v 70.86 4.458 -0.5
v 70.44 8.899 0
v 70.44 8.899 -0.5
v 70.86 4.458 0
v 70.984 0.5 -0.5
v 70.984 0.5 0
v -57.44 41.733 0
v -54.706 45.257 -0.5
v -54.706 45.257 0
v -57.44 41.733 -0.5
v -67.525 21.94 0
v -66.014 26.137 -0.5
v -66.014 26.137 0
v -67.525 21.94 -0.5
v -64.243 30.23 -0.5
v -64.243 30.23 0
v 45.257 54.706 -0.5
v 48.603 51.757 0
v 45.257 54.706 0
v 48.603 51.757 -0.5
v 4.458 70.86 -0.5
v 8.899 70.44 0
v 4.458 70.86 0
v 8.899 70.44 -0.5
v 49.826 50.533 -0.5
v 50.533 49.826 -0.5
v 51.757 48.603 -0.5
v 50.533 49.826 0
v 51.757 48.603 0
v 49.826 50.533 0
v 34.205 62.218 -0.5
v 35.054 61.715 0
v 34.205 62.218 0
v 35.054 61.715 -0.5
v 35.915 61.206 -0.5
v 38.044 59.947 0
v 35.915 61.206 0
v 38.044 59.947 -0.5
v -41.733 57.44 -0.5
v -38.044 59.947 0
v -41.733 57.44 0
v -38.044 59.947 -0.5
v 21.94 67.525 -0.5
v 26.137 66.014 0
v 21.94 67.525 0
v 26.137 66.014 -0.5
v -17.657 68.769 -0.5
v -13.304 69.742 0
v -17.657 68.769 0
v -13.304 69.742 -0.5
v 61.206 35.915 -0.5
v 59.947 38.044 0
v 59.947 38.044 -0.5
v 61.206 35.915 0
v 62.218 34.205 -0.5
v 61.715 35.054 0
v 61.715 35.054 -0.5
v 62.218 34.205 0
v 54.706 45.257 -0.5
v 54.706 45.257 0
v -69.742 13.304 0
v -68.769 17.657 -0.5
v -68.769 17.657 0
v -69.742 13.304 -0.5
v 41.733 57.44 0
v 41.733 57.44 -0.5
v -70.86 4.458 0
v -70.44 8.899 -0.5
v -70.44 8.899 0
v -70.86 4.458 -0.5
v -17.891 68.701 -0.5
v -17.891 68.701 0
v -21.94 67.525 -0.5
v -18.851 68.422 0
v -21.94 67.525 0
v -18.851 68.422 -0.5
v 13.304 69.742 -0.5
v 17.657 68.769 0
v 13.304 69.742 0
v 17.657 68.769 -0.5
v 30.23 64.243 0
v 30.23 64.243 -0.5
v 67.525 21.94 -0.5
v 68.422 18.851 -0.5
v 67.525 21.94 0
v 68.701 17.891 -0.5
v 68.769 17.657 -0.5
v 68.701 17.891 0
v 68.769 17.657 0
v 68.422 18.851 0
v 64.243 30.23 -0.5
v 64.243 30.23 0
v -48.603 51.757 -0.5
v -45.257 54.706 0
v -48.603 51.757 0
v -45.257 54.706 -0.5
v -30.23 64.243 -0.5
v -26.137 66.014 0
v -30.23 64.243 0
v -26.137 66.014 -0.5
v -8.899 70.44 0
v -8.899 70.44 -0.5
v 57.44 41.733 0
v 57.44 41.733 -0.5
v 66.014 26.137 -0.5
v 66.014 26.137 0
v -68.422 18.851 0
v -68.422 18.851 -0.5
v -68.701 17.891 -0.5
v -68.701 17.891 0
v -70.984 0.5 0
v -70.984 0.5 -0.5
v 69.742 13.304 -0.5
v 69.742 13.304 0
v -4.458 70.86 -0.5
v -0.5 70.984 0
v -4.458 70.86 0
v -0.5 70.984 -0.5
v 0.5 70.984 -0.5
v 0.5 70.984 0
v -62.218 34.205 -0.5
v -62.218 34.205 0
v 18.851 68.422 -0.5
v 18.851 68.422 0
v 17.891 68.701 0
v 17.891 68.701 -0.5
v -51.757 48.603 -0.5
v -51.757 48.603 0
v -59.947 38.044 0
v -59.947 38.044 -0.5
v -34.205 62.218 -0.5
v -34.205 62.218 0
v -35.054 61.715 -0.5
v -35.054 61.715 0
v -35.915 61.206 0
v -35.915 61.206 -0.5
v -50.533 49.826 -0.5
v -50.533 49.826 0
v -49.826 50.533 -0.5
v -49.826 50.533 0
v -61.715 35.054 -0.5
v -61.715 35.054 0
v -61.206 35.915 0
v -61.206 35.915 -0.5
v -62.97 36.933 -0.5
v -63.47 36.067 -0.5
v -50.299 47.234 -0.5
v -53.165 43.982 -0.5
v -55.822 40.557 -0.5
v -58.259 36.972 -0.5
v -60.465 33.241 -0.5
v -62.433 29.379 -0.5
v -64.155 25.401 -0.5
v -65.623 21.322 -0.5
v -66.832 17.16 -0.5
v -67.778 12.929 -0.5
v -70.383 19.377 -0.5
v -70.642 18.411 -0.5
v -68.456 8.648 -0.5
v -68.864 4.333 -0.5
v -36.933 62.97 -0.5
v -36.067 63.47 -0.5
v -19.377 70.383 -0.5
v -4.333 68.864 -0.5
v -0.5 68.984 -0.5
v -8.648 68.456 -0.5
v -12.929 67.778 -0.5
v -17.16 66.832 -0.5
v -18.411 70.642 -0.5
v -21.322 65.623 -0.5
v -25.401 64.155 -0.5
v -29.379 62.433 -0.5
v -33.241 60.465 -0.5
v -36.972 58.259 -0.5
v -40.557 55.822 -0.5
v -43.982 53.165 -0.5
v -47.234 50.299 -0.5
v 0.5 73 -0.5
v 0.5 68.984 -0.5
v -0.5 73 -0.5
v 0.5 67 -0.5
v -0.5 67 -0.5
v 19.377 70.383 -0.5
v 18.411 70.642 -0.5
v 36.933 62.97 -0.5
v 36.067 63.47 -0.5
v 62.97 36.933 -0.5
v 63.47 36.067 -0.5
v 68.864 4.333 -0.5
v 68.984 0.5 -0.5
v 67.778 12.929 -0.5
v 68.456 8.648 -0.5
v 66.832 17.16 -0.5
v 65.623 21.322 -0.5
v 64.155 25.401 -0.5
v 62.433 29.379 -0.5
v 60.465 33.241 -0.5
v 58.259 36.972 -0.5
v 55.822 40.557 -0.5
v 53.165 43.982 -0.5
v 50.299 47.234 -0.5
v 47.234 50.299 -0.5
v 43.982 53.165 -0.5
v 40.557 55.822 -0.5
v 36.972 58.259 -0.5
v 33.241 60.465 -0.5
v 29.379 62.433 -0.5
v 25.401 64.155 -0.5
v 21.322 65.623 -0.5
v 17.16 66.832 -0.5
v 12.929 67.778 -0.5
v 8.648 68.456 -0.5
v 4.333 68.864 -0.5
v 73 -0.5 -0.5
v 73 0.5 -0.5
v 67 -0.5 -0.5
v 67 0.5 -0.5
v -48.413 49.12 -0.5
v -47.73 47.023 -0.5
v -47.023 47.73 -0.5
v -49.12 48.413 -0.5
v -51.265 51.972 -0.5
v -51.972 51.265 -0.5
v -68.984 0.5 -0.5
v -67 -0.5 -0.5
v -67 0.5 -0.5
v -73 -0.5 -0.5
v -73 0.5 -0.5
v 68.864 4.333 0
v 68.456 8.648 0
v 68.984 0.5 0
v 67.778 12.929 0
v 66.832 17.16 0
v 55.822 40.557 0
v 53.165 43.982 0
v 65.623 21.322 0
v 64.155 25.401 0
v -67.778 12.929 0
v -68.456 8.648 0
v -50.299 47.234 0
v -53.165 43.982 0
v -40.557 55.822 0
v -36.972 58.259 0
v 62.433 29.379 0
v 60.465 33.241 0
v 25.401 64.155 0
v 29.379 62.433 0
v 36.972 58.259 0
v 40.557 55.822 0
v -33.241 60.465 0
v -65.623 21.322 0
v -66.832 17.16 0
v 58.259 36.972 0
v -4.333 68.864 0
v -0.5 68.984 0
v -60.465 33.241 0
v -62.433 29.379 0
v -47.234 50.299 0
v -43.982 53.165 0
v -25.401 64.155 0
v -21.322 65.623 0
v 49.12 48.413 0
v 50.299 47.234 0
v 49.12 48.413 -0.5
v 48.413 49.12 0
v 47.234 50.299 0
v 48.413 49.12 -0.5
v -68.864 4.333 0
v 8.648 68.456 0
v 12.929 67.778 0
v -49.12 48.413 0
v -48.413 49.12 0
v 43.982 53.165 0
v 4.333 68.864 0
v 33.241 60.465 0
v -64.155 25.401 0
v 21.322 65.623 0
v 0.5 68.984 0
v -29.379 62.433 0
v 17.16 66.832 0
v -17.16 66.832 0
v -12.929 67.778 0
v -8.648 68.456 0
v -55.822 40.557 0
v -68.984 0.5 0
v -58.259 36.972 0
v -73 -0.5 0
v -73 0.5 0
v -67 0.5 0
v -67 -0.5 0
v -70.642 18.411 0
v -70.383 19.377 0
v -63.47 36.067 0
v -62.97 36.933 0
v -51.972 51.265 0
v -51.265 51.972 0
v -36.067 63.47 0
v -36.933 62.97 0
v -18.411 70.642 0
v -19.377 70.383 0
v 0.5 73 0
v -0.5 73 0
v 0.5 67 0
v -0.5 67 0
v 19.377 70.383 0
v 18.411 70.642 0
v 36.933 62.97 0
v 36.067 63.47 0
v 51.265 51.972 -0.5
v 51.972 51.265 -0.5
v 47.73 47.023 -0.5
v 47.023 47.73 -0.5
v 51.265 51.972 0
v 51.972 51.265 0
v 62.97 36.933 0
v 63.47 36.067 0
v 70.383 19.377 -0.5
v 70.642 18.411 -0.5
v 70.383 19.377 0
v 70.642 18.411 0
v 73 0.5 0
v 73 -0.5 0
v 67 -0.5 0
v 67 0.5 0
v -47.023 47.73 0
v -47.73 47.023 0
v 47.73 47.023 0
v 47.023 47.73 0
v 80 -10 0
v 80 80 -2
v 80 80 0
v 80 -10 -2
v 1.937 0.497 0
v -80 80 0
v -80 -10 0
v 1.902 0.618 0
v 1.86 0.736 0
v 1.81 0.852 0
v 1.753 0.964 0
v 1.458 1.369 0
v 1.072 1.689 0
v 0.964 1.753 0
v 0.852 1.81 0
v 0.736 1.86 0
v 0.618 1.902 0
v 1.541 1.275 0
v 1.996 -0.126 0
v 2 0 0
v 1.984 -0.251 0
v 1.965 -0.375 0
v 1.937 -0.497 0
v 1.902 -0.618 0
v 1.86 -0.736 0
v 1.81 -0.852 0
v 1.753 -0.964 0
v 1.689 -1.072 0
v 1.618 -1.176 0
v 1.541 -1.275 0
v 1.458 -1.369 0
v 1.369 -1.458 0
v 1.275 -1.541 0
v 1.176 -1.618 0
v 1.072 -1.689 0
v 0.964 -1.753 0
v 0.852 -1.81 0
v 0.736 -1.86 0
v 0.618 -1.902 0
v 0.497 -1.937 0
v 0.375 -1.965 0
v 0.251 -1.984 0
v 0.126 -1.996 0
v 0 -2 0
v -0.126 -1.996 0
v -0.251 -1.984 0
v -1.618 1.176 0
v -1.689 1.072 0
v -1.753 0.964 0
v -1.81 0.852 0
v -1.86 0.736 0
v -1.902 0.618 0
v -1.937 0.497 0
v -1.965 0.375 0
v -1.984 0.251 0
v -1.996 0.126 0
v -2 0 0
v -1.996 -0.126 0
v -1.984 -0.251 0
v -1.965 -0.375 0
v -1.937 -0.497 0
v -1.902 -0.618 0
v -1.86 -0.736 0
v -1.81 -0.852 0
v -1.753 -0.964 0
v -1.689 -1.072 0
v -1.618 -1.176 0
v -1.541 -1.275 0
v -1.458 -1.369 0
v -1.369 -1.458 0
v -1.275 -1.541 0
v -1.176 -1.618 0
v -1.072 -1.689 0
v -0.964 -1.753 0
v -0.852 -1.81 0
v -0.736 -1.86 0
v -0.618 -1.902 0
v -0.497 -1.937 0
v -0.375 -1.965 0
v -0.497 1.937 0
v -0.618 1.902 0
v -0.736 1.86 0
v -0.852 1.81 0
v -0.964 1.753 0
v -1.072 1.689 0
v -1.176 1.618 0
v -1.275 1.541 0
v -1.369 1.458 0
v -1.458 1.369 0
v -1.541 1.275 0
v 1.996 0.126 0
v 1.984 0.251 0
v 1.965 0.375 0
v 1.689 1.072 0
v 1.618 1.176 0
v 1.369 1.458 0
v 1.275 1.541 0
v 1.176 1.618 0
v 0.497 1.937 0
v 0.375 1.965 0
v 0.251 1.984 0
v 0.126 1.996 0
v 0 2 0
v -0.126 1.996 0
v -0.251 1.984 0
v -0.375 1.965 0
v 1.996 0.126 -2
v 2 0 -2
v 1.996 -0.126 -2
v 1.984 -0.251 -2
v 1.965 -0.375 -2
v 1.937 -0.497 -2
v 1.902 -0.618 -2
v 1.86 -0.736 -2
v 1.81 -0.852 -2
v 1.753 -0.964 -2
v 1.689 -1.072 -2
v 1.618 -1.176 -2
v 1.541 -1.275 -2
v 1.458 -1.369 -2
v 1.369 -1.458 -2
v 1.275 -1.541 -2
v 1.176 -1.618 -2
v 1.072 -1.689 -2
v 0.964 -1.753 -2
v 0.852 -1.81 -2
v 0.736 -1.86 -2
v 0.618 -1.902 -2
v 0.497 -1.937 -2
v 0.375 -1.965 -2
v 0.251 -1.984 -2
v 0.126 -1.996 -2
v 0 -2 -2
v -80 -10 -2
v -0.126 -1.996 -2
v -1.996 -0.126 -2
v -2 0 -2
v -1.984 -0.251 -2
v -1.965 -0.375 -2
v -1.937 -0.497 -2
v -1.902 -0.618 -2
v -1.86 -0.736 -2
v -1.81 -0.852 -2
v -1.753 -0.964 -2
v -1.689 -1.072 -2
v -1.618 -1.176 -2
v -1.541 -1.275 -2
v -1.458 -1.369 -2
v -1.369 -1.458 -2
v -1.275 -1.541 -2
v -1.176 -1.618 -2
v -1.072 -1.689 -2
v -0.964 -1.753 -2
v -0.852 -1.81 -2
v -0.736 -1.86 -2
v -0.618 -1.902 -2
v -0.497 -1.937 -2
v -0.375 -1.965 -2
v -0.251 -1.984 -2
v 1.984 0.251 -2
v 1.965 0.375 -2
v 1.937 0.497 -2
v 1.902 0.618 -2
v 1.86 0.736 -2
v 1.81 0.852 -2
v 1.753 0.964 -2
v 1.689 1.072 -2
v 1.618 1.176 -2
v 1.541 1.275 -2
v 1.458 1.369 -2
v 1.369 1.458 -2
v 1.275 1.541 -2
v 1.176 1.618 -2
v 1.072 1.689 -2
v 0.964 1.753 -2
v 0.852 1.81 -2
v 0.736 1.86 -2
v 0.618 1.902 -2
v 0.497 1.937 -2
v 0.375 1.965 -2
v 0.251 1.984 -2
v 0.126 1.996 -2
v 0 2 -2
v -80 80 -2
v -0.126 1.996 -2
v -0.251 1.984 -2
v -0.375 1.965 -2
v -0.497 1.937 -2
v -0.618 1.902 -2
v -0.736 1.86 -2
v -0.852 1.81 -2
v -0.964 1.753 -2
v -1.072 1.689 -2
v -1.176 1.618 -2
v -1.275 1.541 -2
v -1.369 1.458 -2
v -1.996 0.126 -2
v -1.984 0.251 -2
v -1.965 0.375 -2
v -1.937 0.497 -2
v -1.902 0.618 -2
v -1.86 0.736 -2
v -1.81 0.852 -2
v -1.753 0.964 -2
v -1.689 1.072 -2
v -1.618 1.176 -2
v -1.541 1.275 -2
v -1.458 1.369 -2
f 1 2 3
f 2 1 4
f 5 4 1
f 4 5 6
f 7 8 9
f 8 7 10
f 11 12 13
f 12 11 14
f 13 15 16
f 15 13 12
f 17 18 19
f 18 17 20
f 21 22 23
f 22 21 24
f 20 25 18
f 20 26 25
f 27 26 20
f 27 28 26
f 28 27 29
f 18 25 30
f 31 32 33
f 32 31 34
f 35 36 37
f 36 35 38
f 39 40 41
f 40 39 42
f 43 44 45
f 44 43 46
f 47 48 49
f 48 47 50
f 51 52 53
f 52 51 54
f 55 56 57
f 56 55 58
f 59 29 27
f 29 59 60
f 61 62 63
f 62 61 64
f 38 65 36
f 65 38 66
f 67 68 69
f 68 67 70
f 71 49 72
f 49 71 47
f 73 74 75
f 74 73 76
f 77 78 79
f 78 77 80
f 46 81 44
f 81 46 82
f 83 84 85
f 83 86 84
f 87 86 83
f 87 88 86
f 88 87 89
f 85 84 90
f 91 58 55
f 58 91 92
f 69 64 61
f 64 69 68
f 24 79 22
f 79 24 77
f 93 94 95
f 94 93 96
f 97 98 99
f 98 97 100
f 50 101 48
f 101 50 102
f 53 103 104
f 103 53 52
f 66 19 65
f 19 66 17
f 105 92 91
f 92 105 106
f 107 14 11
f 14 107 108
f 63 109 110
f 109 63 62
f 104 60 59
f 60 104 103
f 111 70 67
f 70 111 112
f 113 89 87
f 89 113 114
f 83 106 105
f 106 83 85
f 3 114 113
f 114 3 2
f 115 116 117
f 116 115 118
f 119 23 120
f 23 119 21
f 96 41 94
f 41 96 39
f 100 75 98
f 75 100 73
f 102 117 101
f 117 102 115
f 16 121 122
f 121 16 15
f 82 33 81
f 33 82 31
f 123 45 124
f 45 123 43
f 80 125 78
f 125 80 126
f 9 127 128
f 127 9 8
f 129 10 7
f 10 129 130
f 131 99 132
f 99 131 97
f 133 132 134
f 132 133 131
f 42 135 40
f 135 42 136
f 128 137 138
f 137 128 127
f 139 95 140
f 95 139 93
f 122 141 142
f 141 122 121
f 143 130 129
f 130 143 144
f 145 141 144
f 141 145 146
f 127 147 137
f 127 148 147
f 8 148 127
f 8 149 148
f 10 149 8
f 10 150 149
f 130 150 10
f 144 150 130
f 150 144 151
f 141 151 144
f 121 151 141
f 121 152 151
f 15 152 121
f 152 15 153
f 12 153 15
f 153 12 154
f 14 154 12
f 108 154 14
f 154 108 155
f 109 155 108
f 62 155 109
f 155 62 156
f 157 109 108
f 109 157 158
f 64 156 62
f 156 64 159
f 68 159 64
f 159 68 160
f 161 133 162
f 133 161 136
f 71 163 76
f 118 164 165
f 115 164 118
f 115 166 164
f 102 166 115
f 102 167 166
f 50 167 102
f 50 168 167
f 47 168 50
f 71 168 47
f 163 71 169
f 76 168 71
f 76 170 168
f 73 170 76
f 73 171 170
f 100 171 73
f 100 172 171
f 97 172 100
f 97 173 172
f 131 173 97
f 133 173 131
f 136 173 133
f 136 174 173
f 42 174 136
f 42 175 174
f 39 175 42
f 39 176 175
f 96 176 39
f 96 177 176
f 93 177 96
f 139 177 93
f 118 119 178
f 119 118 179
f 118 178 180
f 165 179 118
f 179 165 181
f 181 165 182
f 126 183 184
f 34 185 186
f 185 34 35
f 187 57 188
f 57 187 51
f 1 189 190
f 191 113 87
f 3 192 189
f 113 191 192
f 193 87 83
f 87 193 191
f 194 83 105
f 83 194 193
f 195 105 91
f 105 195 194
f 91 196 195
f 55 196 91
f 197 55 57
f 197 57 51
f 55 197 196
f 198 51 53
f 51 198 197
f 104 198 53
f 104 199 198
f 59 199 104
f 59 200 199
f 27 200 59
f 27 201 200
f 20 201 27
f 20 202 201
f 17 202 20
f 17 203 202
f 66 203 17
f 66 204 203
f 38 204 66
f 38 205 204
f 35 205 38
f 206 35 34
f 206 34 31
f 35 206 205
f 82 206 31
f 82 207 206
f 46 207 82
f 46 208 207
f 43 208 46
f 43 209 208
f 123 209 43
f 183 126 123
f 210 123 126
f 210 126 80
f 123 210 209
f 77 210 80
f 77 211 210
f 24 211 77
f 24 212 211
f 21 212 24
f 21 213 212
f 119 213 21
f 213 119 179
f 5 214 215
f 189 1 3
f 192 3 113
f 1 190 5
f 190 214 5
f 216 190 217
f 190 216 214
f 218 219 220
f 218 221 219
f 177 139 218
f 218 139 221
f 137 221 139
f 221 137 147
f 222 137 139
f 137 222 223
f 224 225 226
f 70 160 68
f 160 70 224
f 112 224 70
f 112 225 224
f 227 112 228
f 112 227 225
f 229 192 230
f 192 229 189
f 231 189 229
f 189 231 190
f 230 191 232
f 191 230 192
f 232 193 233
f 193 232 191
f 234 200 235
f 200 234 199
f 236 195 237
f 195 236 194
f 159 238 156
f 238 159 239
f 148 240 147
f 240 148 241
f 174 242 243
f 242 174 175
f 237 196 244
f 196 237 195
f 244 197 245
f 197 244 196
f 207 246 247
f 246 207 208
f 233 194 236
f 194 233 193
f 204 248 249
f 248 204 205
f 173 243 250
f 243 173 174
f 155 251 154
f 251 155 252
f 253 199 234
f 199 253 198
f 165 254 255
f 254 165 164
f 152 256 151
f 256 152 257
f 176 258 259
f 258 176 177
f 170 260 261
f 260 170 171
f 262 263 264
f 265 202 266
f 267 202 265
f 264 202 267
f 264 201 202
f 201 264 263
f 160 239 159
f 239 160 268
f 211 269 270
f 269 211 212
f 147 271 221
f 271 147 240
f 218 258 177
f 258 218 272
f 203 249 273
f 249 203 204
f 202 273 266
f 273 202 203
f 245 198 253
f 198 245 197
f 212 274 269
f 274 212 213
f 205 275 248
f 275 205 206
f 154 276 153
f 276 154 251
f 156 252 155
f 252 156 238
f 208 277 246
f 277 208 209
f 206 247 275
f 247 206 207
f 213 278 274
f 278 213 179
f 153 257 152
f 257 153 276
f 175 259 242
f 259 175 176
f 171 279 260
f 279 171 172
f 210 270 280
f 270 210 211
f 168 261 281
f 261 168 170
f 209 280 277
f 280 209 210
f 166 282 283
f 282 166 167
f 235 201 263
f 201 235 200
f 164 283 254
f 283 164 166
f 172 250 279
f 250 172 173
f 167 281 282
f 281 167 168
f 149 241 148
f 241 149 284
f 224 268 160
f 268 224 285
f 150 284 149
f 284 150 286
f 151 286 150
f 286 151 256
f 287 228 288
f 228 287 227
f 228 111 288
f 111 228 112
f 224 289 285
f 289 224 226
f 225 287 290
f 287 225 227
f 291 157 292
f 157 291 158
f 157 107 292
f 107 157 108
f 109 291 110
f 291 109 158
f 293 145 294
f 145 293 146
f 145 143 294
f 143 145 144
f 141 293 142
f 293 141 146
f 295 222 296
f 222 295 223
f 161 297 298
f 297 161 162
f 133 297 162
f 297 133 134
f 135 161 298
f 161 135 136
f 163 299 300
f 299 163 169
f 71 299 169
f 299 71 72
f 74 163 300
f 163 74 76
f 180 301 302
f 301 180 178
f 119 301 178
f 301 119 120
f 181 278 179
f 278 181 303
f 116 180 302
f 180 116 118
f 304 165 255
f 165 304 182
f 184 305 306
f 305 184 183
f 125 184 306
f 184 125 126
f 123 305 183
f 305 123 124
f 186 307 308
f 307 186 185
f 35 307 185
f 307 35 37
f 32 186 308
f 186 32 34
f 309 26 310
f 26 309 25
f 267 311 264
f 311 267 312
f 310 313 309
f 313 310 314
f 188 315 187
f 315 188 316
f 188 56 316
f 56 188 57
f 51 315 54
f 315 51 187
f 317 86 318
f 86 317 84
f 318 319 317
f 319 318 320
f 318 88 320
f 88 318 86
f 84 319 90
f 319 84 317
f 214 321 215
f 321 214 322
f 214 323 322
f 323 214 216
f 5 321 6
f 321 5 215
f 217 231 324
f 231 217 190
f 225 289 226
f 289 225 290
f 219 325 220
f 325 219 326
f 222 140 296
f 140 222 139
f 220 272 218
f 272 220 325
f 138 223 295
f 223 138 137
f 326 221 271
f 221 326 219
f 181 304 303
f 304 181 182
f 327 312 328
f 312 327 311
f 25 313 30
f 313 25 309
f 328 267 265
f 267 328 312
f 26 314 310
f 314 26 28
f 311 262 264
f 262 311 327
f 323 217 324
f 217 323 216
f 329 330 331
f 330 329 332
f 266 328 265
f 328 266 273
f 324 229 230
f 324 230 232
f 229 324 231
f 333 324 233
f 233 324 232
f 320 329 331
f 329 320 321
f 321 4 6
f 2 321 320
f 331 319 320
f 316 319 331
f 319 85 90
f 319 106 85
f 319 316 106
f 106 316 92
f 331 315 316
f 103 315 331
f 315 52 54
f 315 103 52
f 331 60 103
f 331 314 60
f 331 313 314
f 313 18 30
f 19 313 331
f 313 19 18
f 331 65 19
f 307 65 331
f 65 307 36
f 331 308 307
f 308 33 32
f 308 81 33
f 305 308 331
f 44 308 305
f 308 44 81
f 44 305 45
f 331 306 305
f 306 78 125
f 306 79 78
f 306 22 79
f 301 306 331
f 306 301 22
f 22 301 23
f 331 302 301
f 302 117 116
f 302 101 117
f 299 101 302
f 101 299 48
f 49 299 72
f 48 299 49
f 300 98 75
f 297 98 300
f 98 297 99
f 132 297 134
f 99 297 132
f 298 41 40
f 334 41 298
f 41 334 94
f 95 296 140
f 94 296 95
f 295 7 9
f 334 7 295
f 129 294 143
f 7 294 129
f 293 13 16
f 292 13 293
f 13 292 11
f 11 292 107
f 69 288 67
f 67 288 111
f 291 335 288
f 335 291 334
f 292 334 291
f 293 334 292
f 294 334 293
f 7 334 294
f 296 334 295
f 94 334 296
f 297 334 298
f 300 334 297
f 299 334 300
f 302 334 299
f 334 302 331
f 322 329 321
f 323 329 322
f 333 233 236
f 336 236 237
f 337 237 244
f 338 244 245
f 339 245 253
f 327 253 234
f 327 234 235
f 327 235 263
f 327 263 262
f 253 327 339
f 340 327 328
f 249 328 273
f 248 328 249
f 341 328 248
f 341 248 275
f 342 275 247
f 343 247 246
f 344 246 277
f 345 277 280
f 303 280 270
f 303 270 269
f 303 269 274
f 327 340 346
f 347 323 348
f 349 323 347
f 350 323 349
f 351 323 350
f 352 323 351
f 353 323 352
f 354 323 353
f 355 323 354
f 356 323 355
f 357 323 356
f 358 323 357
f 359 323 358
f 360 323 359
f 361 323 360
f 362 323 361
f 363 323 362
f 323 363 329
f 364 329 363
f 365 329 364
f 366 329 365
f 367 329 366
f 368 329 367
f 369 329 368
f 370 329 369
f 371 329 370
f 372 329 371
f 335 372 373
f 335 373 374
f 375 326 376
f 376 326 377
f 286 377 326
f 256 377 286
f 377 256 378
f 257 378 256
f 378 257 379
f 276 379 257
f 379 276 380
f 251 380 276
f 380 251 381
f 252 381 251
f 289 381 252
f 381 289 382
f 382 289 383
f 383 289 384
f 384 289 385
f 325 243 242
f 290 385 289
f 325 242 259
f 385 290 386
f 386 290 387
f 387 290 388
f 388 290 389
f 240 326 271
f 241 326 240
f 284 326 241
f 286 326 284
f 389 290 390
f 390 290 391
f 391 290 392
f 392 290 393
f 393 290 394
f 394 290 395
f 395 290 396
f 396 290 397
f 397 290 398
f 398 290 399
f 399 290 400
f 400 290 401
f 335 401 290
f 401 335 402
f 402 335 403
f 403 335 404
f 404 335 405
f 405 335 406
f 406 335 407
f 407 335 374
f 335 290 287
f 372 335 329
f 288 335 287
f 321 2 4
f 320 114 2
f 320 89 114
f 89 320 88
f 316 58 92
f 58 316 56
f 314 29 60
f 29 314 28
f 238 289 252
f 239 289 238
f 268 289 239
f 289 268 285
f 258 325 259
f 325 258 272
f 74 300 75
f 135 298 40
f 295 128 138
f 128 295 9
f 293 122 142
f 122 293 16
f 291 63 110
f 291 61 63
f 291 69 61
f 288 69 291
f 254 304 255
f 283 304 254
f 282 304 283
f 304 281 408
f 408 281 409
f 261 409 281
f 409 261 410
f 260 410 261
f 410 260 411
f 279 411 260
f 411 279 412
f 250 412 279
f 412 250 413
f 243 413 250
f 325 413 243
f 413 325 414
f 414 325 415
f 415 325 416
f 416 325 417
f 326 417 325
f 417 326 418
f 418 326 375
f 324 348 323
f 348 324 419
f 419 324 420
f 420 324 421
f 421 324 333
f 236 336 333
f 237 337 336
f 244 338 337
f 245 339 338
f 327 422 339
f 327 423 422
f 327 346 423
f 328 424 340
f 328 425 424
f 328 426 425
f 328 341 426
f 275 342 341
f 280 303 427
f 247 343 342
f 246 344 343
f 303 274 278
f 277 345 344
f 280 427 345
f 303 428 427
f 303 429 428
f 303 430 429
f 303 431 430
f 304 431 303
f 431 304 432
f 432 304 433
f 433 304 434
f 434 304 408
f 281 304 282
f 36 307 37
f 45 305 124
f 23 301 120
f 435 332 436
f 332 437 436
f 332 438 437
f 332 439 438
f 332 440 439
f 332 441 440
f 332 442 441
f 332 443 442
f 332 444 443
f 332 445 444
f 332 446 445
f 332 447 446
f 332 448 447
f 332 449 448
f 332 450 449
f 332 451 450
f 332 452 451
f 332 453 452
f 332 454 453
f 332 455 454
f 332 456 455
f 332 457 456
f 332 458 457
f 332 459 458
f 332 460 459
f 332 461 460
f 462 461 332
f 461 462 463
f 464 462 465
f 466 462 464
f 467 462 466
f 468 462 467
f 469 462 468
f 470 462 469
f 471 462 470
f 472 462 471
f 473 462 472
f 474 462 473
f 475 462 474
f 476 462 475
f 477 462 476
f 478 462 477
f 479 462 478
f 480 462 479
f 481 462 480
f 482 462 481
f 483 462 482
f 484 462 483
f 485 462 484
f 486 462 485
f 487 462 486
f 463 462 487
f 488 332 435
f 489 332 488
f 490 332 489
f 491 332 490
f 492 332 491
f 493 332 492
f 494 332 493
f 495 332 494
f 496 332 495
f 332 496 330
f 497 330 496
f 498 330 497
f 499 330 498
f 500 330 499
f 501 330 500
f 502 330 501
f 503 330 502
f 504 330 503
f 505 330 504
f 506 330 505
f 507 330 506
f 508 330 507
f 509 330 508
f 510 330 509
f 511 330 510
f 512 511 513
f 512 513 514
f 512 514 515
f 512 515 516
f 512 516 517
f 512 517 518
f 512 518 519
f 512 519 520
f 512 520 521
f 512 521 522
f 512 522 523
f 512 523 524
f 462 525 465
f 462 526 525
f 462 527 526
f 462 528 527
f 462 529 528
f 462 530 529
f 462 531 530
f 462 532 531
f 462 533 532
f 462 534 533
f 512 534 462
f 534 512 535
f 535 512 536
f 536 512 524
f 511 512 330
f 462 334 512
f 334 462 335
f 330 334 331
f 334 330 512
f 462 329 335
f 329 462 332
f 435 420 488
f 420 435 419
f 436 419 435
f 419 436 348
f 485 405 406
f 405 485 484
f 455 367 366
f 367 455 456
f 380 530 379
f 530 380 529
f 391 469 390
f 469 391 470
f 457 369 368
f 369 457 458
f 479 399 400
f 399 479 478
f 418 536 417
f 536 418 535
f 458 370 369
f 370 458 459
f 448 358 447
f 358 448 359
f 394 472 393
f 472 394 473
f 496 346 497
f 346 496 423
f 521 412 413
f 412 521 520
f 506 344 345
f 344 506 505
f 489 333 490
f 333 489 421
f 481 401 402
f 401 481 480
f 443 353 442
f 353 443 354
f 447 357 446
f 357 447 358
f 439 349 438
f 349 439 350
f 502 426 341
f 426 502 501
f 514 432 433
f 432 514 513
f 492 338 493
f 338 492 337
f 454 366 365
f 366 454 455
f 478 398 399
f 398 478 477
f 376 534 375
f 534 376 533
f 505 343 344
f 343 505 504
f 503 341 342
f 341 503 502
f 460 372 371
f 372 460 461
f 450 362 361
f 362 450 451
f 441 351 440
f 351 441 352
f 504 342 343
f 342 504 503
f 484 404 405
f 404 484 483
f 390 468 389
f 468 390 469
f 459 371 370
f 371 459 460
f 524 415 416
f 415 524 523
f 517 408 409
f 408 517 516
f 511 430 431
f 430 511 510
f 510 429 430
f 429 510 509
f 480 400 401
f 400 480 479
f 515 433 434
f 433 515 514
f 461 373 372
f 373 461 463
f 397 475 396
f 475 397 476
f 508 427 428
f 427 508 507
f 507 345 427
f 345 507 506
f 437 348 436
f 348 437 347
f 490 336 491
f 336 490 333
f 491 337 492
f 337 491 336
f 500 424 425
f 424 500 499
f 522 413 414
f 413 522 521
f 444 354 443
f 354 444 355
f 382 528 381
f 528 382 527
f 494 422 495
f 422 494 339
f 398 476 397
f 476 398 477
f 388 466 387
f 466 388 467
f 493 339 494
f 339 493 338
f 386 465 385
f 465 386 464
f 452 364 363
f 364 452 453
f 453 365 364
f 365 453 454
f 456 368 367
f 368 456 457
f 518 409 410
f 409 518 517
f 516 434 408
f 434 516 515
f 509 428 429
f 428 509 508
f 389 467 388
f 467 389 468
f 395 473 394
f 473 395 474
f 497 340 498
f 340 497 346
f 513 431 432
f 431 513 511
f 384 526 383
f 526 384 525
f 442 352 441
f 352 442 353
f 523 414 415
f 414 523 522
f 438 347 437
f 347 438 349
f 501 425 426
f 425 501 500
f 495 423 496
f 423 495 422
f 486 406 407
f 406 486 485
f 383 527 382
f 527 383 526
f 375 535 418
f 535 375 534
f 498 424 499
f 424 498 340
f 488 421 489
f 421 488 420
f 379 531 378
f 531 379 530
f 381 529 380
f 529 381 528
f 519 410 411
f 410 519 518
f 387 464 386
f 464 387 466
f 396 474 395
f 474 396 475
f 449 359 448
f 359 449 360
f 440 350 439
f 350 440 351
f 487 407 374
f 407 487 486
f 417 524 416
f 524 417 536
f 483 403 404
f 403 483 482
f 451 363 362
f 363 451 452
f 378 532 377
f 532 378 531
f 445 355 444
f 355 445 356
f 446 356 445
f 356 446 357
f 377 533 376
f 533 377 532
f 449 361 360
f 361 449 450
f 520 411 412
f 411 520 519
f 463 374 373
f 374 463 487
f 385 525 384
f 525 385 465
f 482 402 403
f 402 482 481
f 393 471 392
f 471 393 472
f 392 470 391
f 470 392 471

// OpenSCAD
$fn=100;

//Cadran
union(){
difference() {
    translate([-80,-10,-2])cube([160,90,2]);
    difference() {
        translate([0,0,-0.5])cylinder(h=3,r=71);
        translate([0,0,-0.5])cylinder(h=5,r=69);
    }
    for (a=[0:-15:-180]){
        rotate(a=a, v=[0,0,1])translate([-73,-0.5,-0.5])cube([3,1,1]);
    }
    for (a=[0:-45:-180]){
        rotate(a=a, v=[0,0,1])translate([-73,-0.5,-0.5])cube([6,1,1]);
    }    
    translate([0,0,-5])cylinder(h=10,r=2);
}
    translate([-75,-10,-1])cube([10,9.5,1]);
    translate([65,-10,-1])cube([10,9.5,1]);
}

//Eguille longeur 68
*cube([60,4,2]);
